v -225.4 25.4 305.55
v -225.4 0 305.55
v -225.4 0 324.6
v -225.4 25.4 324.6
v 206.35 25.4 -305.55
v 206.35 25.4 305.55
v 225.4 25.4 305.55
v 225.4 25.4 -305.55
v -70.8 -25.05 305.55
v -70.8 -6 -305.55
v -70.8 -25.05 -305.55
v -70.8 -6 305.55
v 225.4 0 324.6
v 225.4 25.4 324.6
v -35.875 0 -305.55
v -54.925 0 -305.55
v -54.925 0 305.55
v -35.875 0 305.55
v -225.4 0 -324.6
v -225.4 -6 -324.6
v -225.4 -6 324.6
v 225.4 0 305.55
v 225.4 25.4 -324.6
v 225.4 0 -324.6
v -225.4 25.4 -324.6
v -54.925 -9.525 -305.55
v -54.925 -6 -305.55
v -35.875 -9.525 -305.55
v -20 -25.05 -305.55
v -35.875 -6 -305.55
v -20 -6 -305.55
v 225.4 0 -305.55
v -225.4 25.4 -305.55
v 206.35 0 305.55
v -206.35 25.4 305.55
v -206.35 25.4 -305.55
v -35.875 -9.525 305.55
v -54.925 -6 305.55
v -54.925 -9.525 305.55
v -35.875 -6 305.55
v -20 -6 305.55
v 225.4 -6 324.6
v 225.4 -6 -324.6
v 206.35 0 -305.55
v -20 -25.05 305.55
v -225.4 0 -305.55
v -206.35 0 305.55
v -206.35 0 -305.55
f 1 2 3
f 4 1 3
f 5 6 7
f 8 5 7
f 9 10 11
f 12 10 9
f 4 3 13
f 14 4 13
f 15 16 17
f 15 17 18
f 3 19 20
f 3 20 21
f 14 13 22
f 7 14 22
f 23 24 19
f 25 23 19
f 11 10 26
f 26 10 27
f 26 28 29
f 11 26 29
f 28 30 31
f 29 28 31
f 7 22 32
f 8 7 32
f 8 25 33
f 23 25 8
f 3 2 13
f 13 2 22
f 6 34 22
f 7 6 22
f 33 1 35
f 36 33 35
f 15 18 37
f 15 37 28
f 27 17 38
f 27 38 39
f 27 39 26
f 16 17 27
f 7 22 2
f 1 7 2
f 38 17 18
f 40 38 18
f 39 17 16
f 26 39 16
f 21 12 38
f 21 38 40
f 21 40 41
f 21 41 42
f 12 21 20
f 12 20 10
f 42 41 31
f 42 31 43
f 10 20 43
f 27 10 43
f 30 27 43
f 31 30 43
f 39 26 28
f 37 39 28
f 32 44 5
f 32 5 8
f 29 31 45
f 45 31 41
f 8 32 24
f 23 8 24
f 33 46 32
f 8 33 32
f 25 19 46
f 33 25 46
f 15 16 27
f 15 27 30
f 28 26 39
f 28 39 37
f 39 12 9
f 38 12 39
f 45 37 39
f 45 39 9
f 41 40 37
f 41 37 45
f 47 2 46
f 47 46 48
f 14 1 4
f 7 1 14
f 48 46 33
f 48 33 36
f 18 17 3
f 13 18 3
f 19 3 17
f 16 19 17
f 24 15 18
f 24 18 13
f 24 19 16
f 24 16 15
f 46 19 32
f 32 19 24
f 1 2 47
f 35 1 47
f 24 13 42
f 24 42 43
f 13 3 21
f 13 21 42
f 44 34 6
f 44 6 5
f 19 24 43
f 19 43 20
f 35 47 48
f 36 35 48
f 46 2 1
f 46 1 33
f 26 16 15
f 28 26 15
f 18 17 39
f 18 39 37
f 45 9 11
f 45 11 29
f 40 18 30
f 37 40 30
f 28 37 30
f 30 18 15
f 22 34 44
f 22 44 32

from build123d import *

# Parameters (mm, degrees)
SKETCH1_W             = 450.8
SKETCH1_H             = 649.2
BOSS_EXTRUDE1_DEPTH   = 6
SKETCH1_3_W           = 19.05
SKETCH1_3_H           = 611.1
BOSS_EXTRUDE2_DEPTH   = 25.4
BOSS_EXTRUDE2_2_DEPTH = 25.4
SKETCH1_4_W           = 450.8
SKETCH1_4_H           = 19.05
BOSS_EXTRUDE3_DEPTH   = 25.4
BOSS_EXTRUDE3_2_DEPTH = 25.4
SKETCH4_W             = 50.8
SKETCH4_H             = 611.1
BOSS_EXTRUDE5_DEPTH   = 19.05
SKETCH2_W             = 19.05
SKETCH2_H             = 611.1
CUT_EXTRUDE1_DEPTH    = 9.525
SKETCH2_2_W           = 19.05
SKETCH2_2_H           = 611.1
BOSS_EXTRUDE4_DEPTH   = 9.525


with BuildPart() as part:
    # Sketch1 → Boss-Extrude1 (new body)
    with BuildSketch(Plane(origin=(0, 0, 0), x_dir=(1, 0, 0), z_dir=(0, 1, 0))):
        Rectangle(SKETCH1_W, SKETCH1_H)
    extrude(amount=-BOSS_EXTRUDE1_DEPTH)

    # Sketch4 → Boss-Extrude5 (add)
    with BuildSketch(Plane.XZ.offset(6)):
        with Locations((-45.4, 0)):
            Rectangle(SKETCH4_W, SKETCH4_H)
    extrude(amount=BOSS_EXTRUDE5_DEPTH)

    # Sketch2 → Cut-Extrude1 (cut)
    with BuildSketch(Plane(origin=(0, 0, 0), x_dir=(1, 0, 0), z_dir=(0, 1, 0))):
        with Locations((-45.4, 0)):
            Rectangle(SKETCH2_W, SKETCH2_H)
    extrude(amount=-CUT_EXTRUDE1_DEPTH, mode=Mode.SUBTRACT)


with BuildPart() as body_2:
    # Sketch1<3> → Boss-Extrude2 (new body)
    with BuildSketch(Plane(origin=(0, 0, 0), x_dir=(1, 0, 0), z_dir=(0, 1, 0))):
        with Locations((215.875, 0)):
            Rectangle(SKETCH1_3_W, SKETCH1_3_H)
    extrude(amount=BOSS_EXTRUDE2_DEPTH)


with BuildPart() as body_3:
    # Sketch1<3> → Boss-Extrude2 2 (new body)
    with BuildSketch(Plane(origin=(0, 0, 0), x_dir=(1, 0, 0), z_dir=(0, 1, 0))):
        with Locations((-215.875, 0)):
            Rectangle(SKETCH1_3_W, SKETCH1_3_H)
    extrude(amount=BOSS_EXTRUDE2_2_DEPTH)


with BuildPart() as body_4:
    # Sketch1<4> → Boss-Extrude3 (new body)
    with BuildSketch(Plane(origin=(0, 0, 0), x_dir=(1, 0, 0), z_dir=(0, 1, 0))):
        with Locations((0, 315.075)):
            Rectangle(SKETCH1_4_W, SKETCH1_4_H)
    extrude(amount=BOSS_EXTRUDE3_DEPTH)


with BuildPart() as body_5:
    # Sketch1<4> → Boss-Extrude3 2 (new body)
    with BuildSketch(Plane(origin=(0, 0, 0), x_dir=(1, 0, 0), z_dir=(0, 1, 0))):
        with Locations((0, -315.075)):
            Rectangle(SKETCH1_4_W, SKETCH1_4_H)
    extrude(amount=BOSS_EXTRUDE3_2_DEPTH)


with BuildPart() as body_6:
    # Sketch2<2> → Boss-Extrude4 (new body)
    with BuildSketch(Plane(origin=(0, 0, 0), x_dir=(1, 0, 0), z_dir=(0, 1, 0))):
        with Locations((-45.4, 0)):
            Rectangle(SKETCH2_2_W, SKETCH2_2_H)
    extrude(amount=-BOSS_EXTRUDE4_DEPTH)


solid = Compound([part.part, body_2.part, body_3.part, body_4.part, body_5.part, body_6.part])
